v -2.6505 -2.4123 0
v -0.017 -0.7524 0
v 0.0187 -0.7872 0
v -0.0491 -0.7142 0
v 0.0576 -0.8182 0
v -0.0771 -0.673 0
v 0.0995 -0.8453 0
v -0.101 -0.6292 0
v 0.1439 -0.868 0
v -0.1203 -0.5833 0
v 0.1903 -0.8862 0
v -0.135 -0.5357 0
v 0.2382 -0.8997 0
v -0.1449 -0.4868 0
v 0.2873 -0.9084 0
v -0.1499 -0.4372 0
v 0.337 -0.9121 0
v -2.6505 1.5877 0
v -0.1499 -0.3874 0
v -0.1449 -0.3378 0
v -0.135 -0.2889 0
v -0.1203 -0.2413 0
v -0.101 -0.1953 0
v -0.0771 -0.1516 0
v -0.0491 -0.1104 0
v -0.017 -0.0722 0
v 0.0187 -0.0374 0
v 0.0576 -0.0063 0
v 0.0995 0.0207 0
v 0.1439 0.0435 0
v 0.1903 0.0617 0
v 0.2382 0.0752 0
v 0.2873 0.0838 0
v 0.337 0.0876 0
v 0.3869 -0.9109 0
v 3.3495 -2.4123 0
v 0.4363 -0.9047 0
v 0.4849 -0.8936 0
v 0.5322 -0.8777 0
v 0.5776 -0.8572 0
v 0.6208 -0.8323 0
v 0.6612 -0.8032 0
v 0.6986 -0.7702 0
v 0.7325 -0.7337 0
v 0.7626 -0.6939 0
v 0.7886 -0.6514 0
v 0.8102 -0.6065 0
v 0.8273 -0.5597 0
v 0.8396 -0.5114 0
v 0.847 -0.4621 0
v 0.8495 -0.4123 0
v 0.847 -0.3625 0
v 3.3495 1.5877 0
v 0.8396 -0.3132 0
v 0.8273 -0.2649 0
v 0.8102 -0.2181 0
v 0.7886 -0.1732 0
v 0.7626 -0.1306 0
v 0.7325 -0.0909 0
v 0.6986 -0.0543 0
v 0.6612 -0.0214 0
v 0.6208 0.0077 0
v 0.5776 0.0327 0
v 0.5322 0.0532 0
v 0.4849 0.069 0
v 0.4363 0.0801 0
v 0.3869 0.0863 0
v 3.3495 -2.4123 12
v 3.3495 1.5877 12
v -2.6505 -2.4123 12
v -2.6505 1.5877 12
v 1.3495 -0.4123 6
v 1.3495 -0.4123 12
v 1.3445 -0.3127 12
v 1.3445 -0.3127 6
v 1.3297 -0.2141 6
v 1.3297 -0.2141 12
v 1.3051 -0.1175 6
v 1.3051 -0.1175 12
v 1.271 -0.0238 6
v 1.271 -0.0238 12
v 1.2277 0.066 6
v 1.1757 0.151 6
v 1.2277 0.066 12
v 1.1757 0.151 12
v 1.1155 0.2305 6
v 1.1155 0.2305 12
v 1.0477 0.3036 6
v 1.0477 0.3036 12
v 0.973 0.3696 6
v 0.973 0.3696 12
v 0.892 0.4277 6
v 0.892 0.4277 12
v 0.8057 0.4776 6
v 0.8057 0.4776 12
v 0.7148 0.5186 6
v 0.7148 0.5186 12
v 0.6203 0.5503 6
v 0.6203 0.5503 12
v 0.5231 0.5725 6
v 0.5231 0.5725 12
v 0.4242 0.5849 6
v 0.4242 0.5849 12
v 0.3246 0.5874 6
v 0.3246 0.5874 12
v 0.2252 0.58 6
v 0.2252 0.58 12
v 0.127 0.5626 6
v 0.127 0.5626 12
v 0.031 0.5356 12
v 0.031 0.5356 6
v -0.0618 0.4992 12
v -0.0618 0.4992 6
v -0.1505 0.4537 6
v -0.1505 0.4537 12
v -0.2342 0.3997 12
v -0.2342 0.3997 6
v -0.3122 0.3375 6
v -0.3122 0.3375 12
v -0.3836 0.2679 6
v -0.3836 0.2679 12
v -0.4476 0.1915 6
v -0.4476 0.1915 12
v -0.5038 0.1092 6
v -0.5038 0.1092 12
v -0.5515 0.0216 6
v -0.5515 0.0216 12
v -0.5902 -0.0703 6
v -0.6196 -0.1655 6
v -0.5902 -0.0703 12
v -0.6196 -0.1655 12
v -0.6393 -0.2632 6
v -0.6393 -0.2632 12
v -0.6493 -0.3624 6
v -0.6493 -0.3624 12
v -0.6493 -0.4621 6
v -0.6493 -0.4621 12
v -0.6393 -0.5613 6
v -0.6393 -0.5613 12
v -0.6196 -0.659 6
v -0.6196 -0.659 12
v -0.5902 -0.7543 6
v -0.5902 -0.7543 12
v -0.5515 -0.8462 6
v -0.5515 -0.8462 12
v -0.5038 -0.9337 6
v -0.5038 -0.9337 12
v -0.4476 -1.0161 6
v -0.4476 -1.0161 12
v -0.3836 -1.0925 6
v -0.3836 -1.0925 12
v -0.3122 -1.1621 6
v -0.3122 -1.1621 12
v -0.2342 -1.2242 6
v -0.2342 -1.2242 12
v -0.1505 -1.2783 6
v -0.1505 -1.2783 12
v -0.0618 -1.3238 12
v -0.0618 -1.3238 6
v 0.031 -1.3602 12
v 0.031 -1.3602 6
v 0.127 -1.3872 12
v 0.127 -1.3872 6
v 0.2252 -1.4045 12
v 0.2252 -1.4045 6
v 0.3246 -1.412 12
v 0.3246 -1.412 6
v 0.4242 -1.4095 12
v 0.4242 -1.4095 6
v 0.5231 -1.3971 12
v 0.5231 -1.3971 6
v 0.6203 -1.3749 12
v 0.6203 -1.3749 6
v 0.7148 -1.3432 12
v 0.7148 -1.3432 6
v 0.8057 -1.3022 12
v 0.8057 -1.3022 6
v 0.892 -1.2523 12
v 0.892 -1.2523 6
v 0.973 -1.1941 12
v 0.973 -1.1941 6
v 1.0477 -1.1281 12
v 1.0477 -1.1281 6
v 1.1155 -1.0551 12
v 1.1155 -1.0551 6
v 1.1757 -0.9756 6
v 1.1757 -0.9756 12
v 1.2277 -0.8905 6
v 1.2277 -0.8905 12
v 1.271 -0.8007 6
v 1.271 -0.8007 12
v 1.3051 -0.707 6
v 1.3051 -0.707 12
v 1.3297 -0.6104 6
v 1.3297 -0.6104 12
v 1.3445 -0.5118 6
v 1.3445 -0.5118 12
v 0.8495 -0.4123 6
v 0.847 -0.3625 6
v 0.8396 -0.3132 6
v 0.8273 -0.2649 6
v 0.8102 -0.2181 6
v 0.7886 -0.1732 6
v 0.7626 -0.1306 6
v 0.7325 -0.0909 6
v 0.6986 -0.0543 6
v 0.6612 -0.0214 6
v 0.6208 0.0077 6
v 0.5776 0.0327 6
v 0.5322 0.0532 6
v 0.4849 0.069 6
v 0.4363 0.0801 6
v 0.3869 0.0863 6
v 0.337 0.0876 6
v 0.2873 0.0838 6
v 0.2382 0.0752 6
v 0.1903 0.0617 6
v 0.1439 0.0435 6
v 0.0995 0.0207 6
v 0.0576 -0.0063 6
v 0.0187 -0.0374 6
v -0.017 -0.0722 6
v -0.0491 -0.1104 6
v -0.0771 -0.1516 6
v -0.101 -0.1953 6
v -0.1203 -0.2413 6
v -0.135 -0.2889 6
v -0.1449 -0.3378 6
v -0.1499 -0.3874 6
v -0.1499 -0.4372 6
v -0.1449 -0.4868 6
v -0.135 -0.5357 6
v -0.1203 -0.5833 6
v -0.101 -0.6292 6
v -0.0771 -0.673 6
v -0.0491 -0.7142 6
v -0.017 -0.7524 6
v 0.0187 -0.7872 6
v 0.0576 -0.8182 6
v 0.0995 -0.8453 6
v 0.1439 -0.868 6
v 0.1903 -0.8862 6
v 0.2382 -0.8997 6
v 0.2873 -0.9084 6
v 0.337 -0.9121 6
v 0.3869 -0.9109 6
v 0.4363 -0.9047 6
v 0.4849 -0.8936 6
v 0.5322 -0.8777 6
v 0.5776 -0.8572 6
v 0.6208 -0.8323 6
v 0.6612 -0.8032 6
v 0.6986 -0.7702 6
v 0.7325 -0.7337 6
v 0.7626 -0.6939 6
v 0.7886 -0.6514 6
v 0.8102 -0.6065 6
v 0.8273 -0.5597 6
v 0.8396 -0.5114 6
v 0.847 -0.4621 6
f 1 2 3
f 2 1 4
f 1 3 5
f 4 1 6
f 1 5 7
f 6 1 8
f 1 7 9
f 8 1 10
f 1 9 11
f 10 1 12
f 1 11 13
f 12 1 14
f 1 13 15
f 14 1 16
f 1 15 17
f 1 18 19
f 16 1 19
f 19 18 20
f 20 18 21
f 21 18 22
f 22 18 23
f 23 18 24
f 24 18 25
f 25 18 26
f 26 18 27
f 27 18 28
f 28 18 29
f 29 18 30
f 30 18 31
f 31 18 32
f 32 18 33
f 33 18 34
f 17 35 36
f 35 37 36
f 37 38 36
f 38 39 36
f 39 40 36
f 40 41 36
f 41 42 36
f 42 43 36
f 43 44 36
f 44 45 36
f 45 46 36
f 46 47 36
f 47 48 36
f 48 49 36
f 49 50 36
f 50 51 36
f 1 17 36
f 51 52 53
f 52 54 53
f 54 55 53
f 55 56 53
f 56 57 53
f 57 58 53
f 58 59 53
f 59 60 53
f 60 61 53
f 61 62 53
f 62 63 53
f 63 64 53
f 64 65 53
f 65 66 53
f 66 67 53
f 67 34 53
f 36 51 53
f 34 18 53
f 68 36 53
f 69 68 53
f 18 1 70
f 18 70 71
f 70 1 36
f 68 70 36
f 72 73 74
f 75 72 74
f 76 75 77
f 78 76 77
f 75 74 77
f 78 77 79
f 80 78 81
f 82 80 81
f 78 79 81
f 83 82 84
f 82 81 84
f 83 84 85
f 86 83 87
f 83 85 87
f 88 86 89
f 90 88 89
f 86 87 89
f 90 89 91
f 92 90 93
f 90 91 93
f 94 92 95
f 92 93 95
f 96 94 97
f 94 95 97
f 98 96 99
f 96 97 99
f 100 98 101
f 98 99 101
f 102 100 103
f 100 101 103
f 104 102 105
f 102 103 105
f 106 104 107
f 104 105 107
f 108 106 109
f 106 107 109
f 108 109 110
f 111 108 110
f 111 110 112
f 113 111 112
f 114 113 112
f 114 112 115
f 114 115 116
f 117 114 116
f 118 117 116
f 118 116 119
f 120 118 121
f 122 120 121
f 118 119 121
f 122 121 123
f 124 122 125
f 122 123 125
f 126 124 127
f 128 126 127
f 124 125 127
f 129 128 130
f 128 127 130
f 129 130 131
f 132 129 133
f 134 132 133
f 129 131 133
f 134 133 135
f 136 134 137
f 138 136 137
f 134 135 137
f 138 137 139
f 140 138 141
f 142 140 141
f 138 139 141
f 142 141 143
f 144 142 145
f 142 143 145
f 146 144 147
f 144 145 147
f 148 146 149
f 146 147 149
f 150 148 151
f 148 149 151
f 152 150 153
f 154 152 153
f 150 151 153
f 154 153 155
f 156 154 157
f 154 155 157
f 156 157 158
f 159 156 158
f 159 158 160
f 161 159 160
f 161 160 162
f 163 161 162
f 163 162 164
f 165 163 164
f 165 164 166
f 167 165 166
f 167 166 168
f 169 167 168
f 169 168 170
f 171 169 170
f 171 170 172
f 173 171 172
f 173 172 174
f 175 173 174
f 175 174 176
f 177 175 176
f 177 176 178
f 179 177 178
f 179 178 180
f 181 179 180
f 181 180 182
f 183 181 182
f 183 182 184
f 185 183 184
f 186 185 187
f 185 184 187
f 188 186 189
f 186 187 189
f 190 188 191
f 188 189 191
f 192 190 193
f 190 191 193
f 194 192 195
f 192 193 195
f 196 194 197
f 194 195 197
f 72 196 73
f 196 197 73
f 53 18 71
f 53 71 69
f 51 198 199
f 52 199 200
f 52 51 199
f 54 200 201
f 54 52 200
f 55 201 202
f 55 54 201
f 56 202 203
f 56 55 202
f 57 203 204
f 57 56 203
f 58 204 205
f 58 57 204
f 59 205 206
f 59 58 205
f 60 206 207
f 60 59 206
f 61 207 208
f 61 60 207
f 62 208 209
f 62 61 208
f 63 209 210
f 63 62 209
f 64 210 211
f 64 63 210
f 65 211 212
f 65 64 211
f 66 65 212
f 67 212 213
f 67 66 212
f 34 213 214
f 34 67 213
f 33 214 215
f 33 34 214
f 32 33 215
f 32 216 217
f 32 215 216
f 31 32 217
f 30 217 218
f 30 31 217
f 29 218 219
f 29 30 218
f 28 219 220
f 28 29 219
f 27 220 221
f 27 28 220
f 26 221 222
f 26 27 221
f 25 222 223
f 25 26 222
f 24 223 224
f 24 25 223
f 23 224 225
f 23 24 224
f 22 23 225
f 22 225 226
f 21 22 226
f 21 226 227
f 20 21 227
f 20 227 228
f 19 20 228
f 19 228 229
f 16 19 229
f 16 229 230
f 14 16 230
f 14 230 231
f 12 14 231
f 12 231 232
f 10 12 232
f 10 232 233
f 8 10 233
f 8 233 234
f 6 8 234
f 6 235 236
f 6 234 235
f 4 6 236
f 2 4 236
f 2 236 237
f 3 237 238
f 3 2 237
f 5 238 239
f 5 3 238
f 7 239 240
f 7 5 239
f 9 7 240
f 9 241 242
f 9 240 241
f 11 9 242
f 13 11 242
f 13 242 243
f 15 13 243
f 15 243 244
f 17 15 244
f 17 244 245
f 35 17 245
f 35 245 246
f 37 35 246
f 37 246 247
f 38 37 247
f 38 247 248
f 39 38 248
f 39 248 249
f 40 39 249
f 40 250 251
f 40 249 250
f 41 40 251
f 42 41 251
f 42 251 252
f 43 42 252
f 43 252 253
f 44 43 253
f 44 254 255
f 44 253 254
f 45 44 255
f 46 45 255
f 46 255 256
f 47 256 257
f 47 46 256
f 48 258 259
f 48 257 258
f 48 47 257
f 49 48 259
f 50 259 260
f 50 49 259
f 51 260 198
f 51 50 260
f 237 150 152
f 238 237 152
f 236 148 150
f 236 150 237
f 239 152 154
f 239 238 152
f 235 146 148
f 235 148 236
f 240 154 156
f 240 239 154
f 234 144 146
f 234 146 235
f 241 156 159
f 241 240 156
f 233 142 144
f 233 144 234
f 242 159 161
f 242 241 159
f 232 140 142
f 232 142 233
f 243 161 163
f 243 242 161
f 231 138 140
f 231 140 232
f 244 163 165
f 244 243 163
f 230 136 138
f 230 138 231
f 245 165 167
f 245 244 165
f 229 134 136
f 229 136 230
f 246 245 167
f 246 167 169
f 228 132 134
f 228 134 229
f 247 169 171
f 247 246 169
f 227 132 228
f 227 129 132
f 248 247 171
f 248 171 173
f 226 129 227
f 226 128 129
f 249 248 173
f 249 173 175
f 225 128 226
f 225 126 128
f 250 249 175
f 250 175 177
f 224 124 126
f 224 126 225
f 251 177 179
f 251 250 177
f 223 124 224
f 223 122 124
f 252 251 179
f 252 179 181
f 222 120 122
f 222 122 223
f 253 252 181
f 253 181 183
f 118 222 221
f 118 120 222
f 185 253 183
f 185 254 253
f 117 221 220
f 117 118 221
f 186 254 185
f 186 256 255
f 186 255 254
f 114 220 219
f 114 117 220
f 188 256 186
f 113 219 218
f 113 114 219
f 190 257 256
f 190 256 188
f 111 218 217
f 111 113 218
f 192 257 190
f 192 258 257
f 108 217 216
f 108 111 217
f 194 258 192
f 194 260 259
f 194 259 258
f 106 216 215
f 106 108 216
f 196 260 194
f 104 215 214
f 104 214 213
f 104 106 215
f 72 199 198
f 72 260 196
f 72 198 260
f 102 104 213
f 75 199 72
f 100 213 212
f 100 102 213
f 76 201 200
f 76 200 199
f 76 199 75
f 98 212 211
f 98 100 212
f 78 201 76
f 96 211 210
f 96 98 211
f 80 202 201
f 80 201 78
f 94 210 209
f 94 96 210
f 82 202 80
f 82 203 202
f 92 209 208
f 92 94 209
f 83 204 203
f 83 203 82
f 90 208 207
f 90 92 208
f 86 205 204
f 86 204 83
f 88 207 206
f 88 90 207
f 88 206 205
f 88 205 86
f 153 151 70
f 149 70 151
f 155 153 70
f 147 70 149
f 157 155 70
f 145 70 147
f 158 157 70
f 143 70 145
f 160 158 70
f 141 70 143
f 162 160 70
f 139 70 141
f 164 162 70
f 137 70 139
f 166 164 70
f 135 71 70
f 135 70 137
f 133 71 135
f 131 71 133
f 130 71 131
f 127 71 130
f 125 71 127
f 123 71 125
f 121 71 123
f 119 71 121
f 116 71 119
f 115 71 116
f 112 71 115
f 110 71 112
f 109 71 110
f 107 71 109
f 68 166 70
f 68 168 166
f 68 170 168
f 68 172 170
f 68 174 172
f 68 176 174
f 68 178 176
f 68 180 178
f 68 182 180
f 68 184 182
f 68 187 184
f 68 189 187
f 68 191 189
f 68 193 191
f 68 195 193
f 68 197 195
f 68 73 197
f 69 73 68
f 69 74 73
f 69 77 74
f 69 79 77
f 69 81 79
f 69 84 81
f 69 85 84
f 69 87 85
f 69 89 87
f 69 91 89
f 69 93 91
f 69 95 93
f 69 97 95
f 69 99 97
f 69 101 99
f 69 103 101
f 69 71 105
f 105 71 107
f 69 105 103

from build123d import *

# Parameters (mm, degrees)
ESQUISSE1_W             = 6
ESQUISSE1_H             = 4
ESQUISSE1_R             = 0.5
BOSS_EXTRU_1_DEPTH      = 12
ESQUISSE2_R             = 1
ENL_V_MAT_EXTRU_1_DEPTH = 6


with BuildPart() as part:
    # Esquisse1 → Boss.-Extru.1 (new body)
    with BuildSketch(Plane.XY):
        with Locations((0.349498461, -0.412280702)):
            Rectangle(ESQUISSE1_W, ESQUISSE1_H)
        with Locations((0.349498461, -0.412280702)):
            Circle(ESQUISSE1_R, mode=Mode.SUBTRACT)
    extrude(amount=BOSS_EXTRU_1_DEPTH)

    # Esquisse2 → Enlèv. mat.-Extru.1 (cut)
    with BuildSketch(Plane.XY.offset(12)):
        with Locations((0.349498461, -0.412280702)):
            Circle(ESQUISSE2_R)
    extrude(amount=-ENL_V_MAT_EXTRU_1_DEPTH, mode=Mode.SUBTRACT)


solid = part.part
